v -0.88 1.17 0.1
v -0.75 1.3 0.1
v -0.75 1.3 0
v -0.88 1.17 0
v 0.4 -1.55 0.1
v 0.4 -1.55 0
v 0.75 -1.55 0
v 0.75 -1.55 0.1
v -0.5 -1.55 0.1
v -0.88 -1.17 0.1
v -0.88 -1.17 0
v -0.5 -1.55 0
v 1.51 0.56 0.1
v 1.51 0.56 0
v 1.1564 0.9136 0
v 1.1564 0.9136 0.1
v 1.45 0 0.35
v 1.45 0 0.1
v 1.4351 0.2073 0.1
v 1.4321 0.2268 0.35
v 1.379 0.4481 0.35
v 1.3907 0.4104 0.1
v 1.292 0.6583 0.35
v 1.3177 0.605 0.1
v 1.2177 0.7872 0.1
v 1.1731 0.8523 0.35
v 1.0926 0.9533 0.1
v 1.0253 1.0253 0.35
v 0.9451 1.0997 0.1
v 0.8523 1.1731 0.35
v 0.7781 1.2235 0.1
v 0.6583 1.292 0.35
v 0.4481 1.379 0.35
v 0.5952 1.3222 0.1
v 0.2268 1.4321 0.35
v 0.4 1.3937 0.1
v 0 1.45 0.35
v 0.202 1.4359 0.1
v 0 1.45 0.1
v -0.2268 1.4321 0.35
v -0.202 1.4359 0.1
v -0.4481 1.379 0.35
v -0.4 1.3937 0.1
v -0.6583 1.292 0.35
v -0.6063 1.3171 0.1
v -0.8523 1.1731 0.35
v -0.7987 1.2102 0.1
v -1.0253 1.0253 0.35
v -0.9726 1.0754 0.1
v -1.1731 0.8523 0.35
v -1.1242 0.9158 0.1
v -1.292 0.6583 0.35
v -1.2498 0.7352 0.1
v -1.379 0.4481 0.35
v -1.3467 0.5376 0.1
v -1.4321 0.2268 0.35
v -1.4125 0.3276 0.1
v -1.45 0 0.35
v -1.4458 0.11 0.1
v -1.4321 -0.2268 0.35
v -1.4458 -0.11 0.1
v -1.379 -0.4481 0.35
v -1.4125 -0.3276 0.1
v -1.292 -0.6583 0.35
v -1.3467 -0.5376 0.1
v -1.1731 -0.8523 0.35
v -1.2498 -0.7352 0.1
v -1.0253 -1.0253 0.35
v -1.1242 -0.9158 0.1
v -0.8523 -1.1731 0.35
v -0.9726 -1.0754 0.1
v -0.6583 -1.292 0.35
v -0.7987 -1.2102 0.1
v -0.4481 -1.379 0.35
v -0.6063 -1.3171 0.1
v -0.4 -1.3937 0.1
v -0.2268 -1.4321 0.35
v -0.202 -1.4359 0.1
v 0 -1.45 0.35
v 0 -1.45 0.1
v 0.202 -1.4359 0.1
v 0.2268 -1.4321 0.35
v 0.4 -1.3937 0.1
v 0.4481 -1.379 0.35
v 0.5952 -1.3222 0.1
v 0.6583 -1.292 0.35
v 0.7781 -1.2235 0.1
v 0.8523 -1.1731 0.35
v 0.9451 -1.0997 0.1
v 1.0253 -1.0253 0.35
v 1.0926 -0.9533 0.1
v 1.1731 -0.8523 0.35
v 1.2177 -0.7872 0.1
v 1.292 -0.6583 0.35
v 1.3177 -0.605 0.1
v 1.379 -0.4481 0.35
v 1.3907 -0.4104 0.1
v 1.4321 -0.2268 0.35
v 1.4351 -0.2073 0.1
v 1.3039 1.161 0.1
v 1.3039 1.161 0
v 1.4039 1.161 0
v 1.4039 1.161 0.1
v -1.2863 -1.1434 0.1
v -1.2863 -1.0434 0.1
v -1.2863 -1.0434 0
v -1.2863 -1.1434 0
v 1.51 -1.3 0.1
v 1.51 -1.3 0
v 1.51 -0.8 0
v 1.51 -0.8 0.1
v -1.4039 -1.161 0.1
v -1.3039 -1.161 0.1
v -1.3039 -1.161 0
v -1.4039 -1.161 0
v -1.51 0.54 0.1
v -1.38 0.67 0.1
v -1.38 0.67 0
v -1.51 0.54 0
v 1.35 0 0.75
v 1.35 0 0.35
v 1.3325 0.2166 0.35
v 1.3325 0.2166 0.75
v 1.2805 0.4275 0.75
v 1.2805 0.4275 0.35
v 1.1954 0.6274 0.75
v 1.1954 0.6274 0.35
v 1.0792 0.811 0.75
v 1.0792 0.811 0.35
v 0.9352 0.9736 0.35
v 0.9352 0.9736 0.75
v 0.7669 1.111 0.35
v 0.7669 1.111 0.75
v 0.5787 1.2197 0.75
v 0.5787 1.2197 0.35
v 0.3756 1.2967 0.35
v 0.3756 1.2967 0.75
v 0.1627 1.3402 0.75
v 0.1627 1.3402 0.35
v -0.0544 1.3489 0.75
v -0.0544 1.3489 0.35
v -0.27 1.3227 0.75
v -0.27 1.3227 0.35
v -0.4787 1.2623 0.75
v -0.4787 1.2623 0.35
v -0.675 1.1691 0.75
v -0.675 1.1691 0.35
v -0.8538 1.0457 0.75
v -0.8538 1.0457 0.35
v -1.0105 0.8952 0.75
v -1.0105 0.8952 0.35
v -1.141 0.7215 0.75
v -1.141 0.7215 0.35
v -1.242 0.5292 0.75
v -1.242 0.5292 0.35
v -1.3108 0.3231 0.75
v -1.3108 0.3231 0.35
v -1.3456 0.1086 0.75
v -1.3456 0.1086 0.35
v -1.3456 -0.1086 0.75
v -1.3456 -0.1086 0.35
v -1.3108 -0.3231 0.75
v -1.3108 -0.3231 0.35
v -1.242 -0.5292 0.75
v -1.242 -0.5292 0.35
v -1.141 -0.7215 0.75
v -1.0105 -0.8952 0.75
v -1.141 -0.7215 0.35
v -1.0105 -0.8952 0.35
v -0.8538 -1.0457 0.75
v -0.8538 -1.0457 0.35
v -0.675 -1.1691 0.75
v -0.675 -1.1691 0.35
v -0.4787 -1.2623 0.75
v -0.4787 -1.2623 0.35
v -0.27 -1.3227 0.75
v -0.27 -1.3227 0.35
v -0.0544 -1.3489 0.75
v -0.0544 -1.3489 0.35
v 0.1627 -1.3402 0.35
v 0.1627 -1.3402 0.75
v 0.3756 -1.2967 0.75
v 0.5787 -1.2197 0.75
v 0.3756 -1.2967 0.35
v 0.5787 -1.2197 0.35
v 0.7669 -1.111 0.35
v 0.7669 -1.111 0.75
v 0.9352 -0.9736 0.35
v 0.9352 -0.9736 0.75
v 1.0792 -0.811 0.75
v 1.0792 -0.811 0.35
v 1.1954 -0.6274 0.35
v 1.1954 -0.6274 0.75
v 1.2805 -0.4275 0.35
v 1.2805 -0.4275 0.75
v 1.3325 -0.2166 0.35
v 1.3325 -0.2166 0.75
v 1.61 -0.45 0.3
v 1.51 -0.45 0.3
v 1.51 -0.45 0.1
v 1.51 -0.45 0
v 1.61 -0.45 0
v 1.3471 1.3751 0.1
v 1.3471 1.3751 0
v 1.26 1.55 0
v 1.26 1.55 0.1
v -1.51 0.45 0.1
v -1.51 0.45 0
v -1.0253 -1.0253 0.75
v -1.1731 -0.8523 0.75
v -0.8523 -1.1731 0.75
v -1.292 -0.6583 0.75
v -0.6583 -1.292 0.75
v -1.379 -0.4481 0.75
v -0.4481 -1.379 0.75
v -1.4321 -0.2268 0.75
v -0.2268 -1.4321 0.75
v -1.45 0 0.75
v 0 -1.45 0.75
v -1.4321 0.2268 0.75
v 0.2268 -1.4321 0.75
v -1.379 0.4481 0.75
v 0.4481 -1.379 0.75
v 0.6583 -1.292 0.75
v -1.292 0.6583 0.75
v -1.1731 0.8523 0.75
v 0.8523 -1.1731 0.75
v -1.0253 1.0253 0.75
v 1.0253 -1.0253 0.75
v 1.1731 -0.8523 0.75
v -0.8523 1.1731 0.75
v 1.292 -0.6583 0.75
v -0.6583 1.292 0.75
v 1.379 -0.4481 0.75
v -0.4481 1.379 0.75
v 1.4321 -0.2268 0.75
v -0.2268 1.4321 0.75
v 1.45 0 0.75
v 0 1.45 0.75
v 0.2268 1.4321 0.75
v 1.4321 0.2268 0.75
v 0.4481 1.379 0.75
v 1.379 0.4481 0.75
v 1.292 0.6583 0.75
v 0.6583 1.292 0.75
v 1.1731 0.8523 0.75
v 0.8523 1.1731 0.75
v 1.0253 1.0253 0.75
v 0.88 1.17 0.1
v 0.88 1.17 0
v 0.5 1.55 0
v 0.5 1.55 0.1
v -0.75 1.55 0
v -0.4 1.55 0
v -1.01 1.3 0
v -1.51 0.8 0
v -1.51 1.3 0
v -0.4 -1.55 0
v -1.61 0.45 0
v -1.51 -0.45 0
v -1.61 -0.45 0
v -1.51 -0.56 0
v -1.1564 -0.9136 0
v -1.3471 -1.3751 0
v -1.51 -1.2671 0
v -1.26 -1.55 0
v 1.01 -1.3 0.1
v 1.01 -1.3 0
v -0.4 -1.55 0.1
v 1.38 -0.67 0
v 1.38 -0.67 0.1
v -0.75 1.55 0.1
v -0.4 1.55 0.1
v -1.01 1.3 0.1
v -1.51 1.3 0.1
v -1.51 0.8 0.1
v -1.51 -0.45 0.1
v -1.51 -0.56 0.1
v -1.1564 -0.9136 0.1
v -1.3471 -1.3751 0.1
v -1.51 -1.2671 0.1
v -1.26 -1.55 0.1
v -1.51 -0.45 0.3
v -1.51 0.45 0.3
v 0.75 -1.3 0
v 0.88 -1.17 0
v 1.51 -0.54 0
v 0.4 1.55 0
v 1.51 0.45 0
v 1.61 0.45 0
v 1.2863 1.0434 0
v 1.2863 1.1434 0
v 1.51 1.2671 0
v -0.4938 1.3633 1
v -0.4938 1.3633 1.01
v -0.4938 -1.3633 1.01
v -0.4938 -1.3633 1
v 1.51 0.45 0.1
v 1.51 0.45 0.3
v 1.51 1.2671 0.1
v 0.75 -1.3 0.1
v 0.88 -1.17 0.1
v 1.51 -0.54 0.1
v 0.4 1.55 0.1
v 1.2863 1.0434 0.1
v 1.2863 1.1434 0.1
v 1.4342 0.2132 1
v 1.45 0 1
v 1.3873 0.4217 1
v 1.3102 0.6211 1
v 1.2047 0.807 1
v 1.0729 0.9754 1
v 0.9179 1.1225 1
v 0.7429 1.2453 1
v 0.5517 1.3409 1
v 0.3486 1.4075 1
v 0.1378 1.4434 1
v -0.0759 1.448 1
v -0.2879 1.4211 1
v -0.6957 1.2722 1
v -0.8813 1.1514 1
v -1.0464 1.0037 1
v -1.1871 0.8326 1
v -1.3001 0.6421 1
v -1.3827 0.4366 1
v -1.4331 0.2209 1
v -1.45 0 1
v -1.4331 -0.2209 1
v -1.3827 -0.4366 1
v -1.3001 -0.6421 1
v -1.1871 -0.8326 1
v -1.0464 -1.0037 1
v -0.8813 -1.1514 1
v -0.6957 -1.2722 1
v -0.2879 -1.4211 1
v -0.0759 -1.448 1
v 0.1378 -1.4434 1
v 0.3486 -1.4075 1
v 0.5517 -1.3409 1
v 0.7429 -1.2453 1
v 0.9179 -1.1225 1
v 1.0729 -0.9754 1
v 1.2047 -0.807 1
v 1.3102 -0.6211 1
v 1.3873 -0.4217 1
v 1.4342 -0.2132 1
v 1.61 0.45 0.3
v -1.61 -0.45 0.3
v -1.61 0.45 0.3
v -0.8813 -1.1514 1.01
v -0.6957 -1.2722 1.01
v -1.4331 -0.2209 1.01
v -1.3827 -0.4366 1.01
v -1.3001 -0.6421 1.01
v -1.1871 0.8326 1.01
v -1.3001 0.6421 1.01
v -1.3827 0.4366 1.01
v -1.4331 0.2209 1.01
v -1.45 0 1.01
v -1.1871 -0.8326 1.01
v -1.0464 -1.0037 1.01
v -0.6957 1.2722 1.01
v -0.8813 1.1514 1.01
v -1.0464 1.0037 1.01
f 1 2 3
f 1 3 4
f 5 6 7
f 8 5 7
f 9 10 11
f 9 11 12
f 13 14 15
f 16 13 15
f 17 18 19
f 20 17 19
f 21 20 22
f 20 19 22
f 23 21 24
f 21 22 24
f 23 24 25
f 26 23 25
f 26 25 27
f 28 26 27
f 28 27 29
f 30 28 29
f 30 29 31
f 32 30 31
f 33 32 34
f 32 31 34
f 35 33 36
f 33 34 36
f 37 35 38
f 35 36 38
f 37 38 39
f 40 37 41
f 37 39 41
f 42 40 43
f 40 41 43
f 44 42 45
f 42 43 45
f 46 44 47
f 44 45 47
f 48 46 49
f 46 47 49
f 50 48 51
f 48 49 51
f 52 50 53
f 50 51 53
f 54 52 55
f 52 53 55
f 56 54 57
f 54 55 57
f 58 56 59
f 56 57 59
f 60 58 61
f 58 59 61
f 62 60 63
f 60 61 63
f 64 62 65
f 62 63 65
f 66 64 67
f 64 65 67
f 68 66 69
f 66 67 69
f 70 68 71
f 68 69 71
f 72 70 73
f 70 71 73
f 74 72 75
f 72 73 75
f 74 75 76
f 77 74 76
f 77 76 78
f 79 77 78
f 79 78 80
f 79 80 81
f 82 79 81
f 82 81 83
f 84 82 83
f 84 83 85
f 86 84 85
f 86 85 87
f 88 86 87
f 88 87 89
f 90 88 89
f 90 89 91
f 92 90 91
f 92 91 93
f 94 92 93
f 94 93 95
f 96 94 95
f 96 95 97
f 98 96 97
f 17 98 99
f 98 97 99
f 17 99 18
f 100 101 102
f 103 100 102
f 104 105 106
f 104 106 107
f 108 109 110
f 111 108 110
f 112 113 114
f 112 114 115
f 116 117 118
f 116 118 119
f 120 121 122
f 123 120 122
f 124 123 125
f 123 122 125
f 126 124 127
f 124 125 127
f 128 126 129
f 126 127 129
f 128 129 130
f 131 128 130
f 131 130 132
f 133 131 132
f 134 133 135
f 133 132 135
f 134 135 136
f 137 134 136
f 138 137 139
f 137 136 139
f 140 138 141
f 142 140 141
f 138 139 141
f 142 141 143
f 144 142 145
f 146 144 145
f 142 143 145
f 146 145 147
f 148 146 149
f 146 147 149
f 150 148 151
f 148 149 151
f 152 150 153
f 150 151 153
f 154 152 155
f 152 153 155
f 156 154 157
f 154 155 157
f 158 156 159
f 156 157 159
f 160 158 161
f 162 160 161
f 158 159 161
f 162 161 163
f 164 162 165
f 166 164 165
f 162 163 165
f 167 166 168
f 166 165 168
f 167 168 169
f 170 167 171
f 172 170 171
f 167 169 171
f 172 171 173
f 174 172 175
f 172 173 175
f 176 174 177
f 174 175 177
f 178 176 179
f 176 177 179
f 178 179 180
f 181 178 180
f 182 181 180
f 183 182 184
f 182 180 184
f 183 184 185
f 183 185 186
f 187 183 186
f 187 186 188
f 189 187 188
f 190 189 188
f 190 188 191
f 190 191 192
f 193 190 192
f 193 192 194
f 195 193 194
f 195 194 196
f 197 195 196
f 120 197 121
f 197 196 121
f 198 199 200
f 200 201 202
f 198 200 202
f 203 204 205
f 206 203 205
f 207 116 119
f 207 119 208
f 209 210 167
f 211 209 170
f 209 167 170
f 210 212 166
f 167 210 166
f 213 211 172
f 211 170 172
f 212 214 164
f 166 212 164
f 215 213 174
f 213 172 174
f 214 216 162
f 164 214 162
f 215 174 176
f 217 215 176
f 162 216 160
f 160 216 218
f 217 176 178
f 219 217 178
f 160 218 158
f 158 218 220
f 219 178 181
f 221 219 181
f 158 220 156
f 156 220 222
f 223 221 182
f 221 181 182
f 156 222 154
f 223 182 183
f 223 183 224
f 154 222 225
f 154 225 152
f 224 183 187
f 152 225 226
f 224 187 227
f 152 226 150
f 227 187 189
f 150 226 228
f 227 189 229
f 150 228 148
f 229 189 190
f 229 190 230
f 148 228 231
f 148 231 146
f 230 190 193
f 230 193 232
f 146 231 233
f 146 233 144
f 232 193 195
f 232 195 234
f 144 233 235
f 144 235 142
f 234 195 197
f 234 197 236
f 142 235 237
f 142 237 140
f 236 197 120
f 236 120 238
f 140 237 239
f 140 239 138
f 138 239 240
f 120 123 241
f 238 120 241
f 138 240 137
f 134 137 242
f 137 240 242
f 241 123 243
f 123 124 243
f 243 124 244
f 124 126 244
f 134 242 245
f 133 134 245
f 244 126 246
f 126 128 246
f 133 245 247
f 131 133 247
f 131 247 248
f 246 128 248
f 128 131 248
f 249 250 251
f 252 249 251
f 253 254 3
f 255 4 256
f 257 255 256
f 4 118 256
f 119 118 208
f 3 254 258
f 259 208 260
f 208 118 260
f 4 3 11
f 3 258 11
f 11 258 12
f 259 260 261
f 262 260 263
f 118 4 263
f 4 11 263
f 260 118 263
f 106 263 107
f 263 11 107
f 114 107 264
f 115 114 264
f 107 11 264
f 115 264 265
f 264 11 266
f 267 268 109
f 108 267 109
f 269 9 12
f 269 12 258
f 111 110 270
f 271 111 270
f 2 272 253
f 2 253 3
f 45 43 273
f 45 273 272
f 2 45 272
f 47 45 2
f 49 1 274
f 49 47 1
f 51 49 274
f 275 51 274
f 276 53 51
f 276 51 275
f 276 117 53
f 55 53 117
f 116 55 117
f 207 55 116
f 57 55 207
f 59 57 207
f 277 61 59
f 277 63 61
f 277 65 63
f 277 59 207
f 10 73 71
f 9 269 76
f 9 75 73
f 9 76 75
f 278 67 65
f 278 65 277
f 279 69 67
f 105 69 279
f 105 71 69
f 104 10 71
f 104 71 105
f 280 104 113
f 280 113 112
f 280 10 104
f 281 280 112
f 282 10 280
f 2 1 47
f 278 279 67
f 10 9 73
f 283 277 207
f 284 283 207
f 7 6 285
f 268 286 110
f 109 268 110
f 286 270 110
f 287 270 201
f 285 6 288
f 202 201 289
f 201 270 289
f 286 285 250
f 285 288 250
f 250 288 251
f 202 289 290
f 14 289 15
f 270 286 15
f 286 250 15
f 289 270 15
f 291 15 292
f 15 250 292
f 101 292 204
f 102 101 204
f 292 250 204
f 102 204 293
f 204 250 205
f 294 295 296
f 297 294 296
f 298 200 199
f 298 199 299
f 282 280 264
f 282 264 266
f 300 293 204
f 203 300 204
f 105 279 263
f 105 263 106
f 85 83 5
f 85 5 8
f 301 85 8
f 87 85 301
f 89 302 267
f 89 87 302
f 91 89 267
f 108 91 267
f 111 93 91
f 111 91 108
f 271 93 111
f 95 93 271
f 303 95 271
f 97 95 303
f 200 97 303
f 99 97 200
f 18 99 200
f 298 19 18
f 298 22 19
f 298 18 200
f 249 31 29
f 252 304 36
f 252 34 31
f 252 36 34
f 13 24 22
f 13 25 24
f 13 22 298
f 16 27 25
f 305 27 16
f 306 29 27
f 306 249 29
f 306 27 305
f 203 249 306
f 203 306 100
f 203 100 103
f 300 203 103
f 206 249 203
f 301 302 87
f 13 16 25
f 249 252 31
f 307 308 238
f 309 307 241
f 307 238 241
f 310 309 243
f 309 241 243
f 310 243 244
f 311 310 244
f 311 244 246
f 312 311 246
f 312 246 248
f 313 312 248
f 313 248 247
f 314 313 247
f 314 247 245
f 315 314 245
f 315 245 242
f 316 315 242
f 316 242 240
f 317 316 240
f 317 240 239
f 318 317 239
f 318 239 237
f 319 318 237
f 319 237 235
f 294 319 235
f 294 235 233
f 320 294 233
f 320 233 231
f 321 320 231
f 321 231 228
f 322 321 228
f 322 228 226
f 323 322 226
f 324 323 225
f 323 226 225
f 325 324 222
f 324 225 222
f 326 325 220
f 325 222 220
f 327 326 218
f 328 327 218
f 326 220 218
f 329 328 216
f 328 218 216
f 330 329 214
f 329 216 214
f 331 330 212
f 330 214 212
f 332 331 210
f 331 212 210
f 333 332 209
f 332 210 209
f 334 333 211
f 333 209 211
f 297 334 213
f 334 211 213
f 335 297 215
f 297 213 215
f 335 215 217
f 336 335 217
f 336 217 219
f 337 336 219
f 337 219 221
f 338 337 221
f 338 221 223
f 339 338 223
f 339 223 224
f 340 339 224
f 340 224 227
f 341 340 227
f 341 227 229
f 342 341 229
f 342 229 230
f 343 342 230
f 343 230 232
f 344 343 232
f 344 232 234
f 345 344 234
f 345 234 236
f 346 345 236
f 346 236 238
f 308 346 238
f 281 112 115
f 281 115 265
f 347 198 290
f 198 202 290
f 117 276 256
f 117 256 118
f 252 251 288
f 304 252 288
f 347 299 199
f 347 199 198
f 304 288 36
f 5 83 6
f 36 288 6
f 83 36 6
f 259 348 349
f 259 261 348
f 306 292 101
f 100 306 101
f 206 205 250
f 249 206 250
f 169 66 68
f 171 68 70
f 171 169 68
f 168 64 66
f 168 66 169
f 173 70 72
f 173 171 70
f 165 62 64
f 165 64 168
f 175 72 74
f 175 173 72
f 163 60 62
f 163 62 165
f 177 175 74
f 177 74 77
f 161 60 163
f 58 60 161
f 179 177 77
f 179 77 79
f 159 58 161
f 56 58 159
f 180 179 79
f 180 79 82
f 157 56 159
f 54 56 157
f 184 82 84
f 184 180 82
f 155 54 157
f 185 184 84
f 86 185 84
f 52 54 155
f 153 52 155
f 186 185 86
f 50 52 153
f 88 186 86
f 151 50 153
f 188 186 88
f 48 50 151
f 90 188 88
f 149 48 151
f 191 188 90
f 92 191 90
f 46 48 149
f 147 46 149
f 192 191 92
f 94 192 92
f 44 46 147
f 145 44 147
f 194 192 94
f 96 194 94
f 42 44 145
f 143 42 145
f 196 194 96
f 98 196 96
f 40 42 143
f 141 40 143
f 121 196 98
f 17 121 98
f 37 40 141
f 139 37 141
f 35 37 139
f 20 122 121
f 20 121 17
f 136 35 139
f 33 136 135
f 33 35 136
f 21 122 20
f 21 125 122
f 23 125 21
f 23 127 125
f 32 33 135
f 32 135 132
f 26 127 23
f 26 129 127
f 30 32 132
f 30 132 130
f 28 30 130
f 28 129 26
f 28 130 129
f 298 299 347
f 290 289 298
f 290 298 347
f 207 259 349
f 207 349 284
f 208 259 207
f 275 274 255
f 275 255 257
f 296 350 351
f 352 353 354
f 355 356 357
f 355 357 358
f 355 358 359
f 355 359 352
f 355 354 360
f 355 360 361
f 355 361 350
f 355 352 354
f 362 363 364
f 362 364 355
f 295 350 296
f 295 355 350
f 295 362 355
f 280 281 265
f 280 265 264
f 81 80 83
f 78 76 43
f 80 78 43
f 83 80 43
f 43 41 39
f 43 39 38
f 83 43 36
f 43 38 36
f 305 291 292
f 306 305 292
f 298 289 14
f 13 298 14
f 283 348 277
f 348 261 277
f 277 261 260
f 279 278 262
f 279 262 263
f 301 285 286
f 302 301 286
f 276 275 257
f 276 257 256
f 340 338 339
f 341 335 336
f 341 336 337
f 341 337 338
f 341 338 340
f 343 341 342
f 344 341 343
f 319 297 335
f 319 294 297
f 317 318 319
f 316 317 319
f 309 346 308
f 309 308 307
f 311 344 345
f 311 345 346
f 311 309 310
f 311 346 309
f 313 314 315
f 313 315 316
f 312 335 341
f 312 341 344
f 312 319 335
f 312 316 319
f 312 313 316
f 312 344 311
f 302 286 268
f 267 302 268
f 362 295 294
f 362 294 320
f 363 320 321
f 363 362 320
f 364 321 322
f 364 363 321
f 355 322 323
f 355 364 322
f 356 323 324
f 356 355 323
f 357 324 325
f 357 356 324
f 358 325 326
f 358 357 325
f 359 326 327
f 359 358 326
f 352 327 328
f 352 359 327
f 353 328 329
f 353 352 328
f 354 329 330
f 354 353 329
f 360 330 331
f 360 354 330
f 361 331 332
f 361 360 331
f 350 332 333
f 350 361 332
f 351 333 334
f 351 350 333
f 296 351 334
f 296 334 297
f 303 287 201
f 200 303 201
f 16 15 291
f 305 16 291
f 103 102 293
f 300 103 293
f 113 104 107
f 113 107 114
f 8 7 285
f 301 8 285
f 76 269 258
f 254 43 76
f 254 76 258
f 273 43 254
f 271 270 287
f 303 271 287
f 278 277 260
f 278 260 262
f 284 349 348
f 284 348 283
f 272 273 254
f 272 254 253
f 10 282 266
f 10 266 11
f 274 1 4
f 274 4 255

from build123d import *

# Parameters (mm, degrees)
PAD006_DEPTH                   = 0.01
PAD_DEPTH                      = 0.1
PART_MIRRORING_PLACEMENT_ANGLE = 180
SKETCH002_W                    = 0.1
SKETCH002_H                    = 0.9
PAD002_DEPTH                   = 0.2
SKETCH004_R                    = 1.35
PAD004_DEPTH                   = 0.4
SKETCH005_R                    = 1.45
PAD005_DEPTH                   = 0.25
SKETCH003_R                    = 1.45
PAD003_DEPTH                   = 0.25
SKETCH001_W                    = 0.1
SKETCH001_H                    = 0.9
PAD001_DEPTH                   = 0.2


with BuildPart() as pad006:
    # Sketch006 → Pad006 (new body)
    with BuildSketch(Plane.XY.offset(1.01)):
        with BuildLine():
            ThreePointArc((-0.49376, 1.363342), (-1.45, 0), (-0.49376, -1.363342))
            Line((-0.49376, 1.363342), (-0.49376, -1.363342))
        make_face()
    extrude(amount=-PAD006_DEPTH)


with BuildPart() as pad:
    # Sketch → Pad (new body)
    with BuildSketch(Plane.XY):
        Polygon((0.4, -1.55), (0.75, -1.55), (0.75, -1.3), (0.88, -1.17), (1.01, -1.3), (1.51, -1.3), (1.51, -0.8), (1.38, -0.67), (1.51, -0.54), (1.51, -0.45), (1.61, -0.45), (1.61, 0.45), (1.51, 0.45), (1.51, 0.56), (1.156447, 0.913553), (1.286256, 1.043363), (1.286256, 1.143363), (1.303934, 1.161041), (1.403934, 1.161041), (1.51, 1.267107), (1.347099, 1.37506), (1.26, 1.55), (0.88, 1.17), (0.5, 1.55), (0.4, 1.55), align=None)
    extrude(amount=PAD_DEPTH)


with BuildPart() as pad002:
    # Part__Mirroring: instance of Pad
    add(pad.part.mirror(Plane(origin=(0, 0, 0), x_dir=(0, -1, 0), z_dir=(1, 0, 0))))


with BuildPart() as pad002_1:
    # Part__Mirroring placement: moved
    add(pad002.part.moved(Location((0, 0, 0.1))).rotate(Axis((0, 0, 0.1), (1, 0, 0)), PART_MIRRORING_PLACEMENT_ANGLE))

    # Sketch002 → Pad002 (new body)
    with BuildSketch(Plane.XY.offset(0.1)):
        with Locations((-1.56, 0)):
            Rectangle(SKETCH002_W, SKETCH002_H)
    extrude(amount=PAD002_DEPTH)


with BuildPart() as pad004:
    # Sketch004 → Pad004 (new body)
    with BuildSketch(Plane.XY.offset(0.35)):
        Circle(SKETCH004_R)
    extrude(amount=PAD004_DEPTH)


with BuildPart() as pad005:
    # Sketch005 → Pad005 (new body)
    with BuildSketch(Plane.XY.offset(0.75)):
        Circle(SKETCH005_R)
    extrude(amount=PAD005_DEPTH)


with BuildPart() as pad003:
    # Sketch003 → Pad003 (new body)
    with BuildSketch(Plane.XY.offset(0.1)):
        Circle(SKETCH003_R)
    extrude(amount=PAD003_DEPTH)


with BuildPart() as ind_ell_vfg:
    # Pad001 base: copy of Pad
    add(pad.part)

    # Sketch001 → Pad001 (new body)
    with BuildSketch(Plane.XY.offset(0.1)):
        with Locations((1.56, 0)):
            Rectangle(SKETCH001_W, SKETCH001_H)
    extrude(amount=PAD001_DEPTH)

    # Fusion: union Pad006, Pad002, Pad004, Pad005, Pad003
    add(pad006.part)
    add(pad002_1.part)
    add(pad004.part)
    add(pad005.part)
    add(pad003.part)


solid = ind_ell_vfg.part
